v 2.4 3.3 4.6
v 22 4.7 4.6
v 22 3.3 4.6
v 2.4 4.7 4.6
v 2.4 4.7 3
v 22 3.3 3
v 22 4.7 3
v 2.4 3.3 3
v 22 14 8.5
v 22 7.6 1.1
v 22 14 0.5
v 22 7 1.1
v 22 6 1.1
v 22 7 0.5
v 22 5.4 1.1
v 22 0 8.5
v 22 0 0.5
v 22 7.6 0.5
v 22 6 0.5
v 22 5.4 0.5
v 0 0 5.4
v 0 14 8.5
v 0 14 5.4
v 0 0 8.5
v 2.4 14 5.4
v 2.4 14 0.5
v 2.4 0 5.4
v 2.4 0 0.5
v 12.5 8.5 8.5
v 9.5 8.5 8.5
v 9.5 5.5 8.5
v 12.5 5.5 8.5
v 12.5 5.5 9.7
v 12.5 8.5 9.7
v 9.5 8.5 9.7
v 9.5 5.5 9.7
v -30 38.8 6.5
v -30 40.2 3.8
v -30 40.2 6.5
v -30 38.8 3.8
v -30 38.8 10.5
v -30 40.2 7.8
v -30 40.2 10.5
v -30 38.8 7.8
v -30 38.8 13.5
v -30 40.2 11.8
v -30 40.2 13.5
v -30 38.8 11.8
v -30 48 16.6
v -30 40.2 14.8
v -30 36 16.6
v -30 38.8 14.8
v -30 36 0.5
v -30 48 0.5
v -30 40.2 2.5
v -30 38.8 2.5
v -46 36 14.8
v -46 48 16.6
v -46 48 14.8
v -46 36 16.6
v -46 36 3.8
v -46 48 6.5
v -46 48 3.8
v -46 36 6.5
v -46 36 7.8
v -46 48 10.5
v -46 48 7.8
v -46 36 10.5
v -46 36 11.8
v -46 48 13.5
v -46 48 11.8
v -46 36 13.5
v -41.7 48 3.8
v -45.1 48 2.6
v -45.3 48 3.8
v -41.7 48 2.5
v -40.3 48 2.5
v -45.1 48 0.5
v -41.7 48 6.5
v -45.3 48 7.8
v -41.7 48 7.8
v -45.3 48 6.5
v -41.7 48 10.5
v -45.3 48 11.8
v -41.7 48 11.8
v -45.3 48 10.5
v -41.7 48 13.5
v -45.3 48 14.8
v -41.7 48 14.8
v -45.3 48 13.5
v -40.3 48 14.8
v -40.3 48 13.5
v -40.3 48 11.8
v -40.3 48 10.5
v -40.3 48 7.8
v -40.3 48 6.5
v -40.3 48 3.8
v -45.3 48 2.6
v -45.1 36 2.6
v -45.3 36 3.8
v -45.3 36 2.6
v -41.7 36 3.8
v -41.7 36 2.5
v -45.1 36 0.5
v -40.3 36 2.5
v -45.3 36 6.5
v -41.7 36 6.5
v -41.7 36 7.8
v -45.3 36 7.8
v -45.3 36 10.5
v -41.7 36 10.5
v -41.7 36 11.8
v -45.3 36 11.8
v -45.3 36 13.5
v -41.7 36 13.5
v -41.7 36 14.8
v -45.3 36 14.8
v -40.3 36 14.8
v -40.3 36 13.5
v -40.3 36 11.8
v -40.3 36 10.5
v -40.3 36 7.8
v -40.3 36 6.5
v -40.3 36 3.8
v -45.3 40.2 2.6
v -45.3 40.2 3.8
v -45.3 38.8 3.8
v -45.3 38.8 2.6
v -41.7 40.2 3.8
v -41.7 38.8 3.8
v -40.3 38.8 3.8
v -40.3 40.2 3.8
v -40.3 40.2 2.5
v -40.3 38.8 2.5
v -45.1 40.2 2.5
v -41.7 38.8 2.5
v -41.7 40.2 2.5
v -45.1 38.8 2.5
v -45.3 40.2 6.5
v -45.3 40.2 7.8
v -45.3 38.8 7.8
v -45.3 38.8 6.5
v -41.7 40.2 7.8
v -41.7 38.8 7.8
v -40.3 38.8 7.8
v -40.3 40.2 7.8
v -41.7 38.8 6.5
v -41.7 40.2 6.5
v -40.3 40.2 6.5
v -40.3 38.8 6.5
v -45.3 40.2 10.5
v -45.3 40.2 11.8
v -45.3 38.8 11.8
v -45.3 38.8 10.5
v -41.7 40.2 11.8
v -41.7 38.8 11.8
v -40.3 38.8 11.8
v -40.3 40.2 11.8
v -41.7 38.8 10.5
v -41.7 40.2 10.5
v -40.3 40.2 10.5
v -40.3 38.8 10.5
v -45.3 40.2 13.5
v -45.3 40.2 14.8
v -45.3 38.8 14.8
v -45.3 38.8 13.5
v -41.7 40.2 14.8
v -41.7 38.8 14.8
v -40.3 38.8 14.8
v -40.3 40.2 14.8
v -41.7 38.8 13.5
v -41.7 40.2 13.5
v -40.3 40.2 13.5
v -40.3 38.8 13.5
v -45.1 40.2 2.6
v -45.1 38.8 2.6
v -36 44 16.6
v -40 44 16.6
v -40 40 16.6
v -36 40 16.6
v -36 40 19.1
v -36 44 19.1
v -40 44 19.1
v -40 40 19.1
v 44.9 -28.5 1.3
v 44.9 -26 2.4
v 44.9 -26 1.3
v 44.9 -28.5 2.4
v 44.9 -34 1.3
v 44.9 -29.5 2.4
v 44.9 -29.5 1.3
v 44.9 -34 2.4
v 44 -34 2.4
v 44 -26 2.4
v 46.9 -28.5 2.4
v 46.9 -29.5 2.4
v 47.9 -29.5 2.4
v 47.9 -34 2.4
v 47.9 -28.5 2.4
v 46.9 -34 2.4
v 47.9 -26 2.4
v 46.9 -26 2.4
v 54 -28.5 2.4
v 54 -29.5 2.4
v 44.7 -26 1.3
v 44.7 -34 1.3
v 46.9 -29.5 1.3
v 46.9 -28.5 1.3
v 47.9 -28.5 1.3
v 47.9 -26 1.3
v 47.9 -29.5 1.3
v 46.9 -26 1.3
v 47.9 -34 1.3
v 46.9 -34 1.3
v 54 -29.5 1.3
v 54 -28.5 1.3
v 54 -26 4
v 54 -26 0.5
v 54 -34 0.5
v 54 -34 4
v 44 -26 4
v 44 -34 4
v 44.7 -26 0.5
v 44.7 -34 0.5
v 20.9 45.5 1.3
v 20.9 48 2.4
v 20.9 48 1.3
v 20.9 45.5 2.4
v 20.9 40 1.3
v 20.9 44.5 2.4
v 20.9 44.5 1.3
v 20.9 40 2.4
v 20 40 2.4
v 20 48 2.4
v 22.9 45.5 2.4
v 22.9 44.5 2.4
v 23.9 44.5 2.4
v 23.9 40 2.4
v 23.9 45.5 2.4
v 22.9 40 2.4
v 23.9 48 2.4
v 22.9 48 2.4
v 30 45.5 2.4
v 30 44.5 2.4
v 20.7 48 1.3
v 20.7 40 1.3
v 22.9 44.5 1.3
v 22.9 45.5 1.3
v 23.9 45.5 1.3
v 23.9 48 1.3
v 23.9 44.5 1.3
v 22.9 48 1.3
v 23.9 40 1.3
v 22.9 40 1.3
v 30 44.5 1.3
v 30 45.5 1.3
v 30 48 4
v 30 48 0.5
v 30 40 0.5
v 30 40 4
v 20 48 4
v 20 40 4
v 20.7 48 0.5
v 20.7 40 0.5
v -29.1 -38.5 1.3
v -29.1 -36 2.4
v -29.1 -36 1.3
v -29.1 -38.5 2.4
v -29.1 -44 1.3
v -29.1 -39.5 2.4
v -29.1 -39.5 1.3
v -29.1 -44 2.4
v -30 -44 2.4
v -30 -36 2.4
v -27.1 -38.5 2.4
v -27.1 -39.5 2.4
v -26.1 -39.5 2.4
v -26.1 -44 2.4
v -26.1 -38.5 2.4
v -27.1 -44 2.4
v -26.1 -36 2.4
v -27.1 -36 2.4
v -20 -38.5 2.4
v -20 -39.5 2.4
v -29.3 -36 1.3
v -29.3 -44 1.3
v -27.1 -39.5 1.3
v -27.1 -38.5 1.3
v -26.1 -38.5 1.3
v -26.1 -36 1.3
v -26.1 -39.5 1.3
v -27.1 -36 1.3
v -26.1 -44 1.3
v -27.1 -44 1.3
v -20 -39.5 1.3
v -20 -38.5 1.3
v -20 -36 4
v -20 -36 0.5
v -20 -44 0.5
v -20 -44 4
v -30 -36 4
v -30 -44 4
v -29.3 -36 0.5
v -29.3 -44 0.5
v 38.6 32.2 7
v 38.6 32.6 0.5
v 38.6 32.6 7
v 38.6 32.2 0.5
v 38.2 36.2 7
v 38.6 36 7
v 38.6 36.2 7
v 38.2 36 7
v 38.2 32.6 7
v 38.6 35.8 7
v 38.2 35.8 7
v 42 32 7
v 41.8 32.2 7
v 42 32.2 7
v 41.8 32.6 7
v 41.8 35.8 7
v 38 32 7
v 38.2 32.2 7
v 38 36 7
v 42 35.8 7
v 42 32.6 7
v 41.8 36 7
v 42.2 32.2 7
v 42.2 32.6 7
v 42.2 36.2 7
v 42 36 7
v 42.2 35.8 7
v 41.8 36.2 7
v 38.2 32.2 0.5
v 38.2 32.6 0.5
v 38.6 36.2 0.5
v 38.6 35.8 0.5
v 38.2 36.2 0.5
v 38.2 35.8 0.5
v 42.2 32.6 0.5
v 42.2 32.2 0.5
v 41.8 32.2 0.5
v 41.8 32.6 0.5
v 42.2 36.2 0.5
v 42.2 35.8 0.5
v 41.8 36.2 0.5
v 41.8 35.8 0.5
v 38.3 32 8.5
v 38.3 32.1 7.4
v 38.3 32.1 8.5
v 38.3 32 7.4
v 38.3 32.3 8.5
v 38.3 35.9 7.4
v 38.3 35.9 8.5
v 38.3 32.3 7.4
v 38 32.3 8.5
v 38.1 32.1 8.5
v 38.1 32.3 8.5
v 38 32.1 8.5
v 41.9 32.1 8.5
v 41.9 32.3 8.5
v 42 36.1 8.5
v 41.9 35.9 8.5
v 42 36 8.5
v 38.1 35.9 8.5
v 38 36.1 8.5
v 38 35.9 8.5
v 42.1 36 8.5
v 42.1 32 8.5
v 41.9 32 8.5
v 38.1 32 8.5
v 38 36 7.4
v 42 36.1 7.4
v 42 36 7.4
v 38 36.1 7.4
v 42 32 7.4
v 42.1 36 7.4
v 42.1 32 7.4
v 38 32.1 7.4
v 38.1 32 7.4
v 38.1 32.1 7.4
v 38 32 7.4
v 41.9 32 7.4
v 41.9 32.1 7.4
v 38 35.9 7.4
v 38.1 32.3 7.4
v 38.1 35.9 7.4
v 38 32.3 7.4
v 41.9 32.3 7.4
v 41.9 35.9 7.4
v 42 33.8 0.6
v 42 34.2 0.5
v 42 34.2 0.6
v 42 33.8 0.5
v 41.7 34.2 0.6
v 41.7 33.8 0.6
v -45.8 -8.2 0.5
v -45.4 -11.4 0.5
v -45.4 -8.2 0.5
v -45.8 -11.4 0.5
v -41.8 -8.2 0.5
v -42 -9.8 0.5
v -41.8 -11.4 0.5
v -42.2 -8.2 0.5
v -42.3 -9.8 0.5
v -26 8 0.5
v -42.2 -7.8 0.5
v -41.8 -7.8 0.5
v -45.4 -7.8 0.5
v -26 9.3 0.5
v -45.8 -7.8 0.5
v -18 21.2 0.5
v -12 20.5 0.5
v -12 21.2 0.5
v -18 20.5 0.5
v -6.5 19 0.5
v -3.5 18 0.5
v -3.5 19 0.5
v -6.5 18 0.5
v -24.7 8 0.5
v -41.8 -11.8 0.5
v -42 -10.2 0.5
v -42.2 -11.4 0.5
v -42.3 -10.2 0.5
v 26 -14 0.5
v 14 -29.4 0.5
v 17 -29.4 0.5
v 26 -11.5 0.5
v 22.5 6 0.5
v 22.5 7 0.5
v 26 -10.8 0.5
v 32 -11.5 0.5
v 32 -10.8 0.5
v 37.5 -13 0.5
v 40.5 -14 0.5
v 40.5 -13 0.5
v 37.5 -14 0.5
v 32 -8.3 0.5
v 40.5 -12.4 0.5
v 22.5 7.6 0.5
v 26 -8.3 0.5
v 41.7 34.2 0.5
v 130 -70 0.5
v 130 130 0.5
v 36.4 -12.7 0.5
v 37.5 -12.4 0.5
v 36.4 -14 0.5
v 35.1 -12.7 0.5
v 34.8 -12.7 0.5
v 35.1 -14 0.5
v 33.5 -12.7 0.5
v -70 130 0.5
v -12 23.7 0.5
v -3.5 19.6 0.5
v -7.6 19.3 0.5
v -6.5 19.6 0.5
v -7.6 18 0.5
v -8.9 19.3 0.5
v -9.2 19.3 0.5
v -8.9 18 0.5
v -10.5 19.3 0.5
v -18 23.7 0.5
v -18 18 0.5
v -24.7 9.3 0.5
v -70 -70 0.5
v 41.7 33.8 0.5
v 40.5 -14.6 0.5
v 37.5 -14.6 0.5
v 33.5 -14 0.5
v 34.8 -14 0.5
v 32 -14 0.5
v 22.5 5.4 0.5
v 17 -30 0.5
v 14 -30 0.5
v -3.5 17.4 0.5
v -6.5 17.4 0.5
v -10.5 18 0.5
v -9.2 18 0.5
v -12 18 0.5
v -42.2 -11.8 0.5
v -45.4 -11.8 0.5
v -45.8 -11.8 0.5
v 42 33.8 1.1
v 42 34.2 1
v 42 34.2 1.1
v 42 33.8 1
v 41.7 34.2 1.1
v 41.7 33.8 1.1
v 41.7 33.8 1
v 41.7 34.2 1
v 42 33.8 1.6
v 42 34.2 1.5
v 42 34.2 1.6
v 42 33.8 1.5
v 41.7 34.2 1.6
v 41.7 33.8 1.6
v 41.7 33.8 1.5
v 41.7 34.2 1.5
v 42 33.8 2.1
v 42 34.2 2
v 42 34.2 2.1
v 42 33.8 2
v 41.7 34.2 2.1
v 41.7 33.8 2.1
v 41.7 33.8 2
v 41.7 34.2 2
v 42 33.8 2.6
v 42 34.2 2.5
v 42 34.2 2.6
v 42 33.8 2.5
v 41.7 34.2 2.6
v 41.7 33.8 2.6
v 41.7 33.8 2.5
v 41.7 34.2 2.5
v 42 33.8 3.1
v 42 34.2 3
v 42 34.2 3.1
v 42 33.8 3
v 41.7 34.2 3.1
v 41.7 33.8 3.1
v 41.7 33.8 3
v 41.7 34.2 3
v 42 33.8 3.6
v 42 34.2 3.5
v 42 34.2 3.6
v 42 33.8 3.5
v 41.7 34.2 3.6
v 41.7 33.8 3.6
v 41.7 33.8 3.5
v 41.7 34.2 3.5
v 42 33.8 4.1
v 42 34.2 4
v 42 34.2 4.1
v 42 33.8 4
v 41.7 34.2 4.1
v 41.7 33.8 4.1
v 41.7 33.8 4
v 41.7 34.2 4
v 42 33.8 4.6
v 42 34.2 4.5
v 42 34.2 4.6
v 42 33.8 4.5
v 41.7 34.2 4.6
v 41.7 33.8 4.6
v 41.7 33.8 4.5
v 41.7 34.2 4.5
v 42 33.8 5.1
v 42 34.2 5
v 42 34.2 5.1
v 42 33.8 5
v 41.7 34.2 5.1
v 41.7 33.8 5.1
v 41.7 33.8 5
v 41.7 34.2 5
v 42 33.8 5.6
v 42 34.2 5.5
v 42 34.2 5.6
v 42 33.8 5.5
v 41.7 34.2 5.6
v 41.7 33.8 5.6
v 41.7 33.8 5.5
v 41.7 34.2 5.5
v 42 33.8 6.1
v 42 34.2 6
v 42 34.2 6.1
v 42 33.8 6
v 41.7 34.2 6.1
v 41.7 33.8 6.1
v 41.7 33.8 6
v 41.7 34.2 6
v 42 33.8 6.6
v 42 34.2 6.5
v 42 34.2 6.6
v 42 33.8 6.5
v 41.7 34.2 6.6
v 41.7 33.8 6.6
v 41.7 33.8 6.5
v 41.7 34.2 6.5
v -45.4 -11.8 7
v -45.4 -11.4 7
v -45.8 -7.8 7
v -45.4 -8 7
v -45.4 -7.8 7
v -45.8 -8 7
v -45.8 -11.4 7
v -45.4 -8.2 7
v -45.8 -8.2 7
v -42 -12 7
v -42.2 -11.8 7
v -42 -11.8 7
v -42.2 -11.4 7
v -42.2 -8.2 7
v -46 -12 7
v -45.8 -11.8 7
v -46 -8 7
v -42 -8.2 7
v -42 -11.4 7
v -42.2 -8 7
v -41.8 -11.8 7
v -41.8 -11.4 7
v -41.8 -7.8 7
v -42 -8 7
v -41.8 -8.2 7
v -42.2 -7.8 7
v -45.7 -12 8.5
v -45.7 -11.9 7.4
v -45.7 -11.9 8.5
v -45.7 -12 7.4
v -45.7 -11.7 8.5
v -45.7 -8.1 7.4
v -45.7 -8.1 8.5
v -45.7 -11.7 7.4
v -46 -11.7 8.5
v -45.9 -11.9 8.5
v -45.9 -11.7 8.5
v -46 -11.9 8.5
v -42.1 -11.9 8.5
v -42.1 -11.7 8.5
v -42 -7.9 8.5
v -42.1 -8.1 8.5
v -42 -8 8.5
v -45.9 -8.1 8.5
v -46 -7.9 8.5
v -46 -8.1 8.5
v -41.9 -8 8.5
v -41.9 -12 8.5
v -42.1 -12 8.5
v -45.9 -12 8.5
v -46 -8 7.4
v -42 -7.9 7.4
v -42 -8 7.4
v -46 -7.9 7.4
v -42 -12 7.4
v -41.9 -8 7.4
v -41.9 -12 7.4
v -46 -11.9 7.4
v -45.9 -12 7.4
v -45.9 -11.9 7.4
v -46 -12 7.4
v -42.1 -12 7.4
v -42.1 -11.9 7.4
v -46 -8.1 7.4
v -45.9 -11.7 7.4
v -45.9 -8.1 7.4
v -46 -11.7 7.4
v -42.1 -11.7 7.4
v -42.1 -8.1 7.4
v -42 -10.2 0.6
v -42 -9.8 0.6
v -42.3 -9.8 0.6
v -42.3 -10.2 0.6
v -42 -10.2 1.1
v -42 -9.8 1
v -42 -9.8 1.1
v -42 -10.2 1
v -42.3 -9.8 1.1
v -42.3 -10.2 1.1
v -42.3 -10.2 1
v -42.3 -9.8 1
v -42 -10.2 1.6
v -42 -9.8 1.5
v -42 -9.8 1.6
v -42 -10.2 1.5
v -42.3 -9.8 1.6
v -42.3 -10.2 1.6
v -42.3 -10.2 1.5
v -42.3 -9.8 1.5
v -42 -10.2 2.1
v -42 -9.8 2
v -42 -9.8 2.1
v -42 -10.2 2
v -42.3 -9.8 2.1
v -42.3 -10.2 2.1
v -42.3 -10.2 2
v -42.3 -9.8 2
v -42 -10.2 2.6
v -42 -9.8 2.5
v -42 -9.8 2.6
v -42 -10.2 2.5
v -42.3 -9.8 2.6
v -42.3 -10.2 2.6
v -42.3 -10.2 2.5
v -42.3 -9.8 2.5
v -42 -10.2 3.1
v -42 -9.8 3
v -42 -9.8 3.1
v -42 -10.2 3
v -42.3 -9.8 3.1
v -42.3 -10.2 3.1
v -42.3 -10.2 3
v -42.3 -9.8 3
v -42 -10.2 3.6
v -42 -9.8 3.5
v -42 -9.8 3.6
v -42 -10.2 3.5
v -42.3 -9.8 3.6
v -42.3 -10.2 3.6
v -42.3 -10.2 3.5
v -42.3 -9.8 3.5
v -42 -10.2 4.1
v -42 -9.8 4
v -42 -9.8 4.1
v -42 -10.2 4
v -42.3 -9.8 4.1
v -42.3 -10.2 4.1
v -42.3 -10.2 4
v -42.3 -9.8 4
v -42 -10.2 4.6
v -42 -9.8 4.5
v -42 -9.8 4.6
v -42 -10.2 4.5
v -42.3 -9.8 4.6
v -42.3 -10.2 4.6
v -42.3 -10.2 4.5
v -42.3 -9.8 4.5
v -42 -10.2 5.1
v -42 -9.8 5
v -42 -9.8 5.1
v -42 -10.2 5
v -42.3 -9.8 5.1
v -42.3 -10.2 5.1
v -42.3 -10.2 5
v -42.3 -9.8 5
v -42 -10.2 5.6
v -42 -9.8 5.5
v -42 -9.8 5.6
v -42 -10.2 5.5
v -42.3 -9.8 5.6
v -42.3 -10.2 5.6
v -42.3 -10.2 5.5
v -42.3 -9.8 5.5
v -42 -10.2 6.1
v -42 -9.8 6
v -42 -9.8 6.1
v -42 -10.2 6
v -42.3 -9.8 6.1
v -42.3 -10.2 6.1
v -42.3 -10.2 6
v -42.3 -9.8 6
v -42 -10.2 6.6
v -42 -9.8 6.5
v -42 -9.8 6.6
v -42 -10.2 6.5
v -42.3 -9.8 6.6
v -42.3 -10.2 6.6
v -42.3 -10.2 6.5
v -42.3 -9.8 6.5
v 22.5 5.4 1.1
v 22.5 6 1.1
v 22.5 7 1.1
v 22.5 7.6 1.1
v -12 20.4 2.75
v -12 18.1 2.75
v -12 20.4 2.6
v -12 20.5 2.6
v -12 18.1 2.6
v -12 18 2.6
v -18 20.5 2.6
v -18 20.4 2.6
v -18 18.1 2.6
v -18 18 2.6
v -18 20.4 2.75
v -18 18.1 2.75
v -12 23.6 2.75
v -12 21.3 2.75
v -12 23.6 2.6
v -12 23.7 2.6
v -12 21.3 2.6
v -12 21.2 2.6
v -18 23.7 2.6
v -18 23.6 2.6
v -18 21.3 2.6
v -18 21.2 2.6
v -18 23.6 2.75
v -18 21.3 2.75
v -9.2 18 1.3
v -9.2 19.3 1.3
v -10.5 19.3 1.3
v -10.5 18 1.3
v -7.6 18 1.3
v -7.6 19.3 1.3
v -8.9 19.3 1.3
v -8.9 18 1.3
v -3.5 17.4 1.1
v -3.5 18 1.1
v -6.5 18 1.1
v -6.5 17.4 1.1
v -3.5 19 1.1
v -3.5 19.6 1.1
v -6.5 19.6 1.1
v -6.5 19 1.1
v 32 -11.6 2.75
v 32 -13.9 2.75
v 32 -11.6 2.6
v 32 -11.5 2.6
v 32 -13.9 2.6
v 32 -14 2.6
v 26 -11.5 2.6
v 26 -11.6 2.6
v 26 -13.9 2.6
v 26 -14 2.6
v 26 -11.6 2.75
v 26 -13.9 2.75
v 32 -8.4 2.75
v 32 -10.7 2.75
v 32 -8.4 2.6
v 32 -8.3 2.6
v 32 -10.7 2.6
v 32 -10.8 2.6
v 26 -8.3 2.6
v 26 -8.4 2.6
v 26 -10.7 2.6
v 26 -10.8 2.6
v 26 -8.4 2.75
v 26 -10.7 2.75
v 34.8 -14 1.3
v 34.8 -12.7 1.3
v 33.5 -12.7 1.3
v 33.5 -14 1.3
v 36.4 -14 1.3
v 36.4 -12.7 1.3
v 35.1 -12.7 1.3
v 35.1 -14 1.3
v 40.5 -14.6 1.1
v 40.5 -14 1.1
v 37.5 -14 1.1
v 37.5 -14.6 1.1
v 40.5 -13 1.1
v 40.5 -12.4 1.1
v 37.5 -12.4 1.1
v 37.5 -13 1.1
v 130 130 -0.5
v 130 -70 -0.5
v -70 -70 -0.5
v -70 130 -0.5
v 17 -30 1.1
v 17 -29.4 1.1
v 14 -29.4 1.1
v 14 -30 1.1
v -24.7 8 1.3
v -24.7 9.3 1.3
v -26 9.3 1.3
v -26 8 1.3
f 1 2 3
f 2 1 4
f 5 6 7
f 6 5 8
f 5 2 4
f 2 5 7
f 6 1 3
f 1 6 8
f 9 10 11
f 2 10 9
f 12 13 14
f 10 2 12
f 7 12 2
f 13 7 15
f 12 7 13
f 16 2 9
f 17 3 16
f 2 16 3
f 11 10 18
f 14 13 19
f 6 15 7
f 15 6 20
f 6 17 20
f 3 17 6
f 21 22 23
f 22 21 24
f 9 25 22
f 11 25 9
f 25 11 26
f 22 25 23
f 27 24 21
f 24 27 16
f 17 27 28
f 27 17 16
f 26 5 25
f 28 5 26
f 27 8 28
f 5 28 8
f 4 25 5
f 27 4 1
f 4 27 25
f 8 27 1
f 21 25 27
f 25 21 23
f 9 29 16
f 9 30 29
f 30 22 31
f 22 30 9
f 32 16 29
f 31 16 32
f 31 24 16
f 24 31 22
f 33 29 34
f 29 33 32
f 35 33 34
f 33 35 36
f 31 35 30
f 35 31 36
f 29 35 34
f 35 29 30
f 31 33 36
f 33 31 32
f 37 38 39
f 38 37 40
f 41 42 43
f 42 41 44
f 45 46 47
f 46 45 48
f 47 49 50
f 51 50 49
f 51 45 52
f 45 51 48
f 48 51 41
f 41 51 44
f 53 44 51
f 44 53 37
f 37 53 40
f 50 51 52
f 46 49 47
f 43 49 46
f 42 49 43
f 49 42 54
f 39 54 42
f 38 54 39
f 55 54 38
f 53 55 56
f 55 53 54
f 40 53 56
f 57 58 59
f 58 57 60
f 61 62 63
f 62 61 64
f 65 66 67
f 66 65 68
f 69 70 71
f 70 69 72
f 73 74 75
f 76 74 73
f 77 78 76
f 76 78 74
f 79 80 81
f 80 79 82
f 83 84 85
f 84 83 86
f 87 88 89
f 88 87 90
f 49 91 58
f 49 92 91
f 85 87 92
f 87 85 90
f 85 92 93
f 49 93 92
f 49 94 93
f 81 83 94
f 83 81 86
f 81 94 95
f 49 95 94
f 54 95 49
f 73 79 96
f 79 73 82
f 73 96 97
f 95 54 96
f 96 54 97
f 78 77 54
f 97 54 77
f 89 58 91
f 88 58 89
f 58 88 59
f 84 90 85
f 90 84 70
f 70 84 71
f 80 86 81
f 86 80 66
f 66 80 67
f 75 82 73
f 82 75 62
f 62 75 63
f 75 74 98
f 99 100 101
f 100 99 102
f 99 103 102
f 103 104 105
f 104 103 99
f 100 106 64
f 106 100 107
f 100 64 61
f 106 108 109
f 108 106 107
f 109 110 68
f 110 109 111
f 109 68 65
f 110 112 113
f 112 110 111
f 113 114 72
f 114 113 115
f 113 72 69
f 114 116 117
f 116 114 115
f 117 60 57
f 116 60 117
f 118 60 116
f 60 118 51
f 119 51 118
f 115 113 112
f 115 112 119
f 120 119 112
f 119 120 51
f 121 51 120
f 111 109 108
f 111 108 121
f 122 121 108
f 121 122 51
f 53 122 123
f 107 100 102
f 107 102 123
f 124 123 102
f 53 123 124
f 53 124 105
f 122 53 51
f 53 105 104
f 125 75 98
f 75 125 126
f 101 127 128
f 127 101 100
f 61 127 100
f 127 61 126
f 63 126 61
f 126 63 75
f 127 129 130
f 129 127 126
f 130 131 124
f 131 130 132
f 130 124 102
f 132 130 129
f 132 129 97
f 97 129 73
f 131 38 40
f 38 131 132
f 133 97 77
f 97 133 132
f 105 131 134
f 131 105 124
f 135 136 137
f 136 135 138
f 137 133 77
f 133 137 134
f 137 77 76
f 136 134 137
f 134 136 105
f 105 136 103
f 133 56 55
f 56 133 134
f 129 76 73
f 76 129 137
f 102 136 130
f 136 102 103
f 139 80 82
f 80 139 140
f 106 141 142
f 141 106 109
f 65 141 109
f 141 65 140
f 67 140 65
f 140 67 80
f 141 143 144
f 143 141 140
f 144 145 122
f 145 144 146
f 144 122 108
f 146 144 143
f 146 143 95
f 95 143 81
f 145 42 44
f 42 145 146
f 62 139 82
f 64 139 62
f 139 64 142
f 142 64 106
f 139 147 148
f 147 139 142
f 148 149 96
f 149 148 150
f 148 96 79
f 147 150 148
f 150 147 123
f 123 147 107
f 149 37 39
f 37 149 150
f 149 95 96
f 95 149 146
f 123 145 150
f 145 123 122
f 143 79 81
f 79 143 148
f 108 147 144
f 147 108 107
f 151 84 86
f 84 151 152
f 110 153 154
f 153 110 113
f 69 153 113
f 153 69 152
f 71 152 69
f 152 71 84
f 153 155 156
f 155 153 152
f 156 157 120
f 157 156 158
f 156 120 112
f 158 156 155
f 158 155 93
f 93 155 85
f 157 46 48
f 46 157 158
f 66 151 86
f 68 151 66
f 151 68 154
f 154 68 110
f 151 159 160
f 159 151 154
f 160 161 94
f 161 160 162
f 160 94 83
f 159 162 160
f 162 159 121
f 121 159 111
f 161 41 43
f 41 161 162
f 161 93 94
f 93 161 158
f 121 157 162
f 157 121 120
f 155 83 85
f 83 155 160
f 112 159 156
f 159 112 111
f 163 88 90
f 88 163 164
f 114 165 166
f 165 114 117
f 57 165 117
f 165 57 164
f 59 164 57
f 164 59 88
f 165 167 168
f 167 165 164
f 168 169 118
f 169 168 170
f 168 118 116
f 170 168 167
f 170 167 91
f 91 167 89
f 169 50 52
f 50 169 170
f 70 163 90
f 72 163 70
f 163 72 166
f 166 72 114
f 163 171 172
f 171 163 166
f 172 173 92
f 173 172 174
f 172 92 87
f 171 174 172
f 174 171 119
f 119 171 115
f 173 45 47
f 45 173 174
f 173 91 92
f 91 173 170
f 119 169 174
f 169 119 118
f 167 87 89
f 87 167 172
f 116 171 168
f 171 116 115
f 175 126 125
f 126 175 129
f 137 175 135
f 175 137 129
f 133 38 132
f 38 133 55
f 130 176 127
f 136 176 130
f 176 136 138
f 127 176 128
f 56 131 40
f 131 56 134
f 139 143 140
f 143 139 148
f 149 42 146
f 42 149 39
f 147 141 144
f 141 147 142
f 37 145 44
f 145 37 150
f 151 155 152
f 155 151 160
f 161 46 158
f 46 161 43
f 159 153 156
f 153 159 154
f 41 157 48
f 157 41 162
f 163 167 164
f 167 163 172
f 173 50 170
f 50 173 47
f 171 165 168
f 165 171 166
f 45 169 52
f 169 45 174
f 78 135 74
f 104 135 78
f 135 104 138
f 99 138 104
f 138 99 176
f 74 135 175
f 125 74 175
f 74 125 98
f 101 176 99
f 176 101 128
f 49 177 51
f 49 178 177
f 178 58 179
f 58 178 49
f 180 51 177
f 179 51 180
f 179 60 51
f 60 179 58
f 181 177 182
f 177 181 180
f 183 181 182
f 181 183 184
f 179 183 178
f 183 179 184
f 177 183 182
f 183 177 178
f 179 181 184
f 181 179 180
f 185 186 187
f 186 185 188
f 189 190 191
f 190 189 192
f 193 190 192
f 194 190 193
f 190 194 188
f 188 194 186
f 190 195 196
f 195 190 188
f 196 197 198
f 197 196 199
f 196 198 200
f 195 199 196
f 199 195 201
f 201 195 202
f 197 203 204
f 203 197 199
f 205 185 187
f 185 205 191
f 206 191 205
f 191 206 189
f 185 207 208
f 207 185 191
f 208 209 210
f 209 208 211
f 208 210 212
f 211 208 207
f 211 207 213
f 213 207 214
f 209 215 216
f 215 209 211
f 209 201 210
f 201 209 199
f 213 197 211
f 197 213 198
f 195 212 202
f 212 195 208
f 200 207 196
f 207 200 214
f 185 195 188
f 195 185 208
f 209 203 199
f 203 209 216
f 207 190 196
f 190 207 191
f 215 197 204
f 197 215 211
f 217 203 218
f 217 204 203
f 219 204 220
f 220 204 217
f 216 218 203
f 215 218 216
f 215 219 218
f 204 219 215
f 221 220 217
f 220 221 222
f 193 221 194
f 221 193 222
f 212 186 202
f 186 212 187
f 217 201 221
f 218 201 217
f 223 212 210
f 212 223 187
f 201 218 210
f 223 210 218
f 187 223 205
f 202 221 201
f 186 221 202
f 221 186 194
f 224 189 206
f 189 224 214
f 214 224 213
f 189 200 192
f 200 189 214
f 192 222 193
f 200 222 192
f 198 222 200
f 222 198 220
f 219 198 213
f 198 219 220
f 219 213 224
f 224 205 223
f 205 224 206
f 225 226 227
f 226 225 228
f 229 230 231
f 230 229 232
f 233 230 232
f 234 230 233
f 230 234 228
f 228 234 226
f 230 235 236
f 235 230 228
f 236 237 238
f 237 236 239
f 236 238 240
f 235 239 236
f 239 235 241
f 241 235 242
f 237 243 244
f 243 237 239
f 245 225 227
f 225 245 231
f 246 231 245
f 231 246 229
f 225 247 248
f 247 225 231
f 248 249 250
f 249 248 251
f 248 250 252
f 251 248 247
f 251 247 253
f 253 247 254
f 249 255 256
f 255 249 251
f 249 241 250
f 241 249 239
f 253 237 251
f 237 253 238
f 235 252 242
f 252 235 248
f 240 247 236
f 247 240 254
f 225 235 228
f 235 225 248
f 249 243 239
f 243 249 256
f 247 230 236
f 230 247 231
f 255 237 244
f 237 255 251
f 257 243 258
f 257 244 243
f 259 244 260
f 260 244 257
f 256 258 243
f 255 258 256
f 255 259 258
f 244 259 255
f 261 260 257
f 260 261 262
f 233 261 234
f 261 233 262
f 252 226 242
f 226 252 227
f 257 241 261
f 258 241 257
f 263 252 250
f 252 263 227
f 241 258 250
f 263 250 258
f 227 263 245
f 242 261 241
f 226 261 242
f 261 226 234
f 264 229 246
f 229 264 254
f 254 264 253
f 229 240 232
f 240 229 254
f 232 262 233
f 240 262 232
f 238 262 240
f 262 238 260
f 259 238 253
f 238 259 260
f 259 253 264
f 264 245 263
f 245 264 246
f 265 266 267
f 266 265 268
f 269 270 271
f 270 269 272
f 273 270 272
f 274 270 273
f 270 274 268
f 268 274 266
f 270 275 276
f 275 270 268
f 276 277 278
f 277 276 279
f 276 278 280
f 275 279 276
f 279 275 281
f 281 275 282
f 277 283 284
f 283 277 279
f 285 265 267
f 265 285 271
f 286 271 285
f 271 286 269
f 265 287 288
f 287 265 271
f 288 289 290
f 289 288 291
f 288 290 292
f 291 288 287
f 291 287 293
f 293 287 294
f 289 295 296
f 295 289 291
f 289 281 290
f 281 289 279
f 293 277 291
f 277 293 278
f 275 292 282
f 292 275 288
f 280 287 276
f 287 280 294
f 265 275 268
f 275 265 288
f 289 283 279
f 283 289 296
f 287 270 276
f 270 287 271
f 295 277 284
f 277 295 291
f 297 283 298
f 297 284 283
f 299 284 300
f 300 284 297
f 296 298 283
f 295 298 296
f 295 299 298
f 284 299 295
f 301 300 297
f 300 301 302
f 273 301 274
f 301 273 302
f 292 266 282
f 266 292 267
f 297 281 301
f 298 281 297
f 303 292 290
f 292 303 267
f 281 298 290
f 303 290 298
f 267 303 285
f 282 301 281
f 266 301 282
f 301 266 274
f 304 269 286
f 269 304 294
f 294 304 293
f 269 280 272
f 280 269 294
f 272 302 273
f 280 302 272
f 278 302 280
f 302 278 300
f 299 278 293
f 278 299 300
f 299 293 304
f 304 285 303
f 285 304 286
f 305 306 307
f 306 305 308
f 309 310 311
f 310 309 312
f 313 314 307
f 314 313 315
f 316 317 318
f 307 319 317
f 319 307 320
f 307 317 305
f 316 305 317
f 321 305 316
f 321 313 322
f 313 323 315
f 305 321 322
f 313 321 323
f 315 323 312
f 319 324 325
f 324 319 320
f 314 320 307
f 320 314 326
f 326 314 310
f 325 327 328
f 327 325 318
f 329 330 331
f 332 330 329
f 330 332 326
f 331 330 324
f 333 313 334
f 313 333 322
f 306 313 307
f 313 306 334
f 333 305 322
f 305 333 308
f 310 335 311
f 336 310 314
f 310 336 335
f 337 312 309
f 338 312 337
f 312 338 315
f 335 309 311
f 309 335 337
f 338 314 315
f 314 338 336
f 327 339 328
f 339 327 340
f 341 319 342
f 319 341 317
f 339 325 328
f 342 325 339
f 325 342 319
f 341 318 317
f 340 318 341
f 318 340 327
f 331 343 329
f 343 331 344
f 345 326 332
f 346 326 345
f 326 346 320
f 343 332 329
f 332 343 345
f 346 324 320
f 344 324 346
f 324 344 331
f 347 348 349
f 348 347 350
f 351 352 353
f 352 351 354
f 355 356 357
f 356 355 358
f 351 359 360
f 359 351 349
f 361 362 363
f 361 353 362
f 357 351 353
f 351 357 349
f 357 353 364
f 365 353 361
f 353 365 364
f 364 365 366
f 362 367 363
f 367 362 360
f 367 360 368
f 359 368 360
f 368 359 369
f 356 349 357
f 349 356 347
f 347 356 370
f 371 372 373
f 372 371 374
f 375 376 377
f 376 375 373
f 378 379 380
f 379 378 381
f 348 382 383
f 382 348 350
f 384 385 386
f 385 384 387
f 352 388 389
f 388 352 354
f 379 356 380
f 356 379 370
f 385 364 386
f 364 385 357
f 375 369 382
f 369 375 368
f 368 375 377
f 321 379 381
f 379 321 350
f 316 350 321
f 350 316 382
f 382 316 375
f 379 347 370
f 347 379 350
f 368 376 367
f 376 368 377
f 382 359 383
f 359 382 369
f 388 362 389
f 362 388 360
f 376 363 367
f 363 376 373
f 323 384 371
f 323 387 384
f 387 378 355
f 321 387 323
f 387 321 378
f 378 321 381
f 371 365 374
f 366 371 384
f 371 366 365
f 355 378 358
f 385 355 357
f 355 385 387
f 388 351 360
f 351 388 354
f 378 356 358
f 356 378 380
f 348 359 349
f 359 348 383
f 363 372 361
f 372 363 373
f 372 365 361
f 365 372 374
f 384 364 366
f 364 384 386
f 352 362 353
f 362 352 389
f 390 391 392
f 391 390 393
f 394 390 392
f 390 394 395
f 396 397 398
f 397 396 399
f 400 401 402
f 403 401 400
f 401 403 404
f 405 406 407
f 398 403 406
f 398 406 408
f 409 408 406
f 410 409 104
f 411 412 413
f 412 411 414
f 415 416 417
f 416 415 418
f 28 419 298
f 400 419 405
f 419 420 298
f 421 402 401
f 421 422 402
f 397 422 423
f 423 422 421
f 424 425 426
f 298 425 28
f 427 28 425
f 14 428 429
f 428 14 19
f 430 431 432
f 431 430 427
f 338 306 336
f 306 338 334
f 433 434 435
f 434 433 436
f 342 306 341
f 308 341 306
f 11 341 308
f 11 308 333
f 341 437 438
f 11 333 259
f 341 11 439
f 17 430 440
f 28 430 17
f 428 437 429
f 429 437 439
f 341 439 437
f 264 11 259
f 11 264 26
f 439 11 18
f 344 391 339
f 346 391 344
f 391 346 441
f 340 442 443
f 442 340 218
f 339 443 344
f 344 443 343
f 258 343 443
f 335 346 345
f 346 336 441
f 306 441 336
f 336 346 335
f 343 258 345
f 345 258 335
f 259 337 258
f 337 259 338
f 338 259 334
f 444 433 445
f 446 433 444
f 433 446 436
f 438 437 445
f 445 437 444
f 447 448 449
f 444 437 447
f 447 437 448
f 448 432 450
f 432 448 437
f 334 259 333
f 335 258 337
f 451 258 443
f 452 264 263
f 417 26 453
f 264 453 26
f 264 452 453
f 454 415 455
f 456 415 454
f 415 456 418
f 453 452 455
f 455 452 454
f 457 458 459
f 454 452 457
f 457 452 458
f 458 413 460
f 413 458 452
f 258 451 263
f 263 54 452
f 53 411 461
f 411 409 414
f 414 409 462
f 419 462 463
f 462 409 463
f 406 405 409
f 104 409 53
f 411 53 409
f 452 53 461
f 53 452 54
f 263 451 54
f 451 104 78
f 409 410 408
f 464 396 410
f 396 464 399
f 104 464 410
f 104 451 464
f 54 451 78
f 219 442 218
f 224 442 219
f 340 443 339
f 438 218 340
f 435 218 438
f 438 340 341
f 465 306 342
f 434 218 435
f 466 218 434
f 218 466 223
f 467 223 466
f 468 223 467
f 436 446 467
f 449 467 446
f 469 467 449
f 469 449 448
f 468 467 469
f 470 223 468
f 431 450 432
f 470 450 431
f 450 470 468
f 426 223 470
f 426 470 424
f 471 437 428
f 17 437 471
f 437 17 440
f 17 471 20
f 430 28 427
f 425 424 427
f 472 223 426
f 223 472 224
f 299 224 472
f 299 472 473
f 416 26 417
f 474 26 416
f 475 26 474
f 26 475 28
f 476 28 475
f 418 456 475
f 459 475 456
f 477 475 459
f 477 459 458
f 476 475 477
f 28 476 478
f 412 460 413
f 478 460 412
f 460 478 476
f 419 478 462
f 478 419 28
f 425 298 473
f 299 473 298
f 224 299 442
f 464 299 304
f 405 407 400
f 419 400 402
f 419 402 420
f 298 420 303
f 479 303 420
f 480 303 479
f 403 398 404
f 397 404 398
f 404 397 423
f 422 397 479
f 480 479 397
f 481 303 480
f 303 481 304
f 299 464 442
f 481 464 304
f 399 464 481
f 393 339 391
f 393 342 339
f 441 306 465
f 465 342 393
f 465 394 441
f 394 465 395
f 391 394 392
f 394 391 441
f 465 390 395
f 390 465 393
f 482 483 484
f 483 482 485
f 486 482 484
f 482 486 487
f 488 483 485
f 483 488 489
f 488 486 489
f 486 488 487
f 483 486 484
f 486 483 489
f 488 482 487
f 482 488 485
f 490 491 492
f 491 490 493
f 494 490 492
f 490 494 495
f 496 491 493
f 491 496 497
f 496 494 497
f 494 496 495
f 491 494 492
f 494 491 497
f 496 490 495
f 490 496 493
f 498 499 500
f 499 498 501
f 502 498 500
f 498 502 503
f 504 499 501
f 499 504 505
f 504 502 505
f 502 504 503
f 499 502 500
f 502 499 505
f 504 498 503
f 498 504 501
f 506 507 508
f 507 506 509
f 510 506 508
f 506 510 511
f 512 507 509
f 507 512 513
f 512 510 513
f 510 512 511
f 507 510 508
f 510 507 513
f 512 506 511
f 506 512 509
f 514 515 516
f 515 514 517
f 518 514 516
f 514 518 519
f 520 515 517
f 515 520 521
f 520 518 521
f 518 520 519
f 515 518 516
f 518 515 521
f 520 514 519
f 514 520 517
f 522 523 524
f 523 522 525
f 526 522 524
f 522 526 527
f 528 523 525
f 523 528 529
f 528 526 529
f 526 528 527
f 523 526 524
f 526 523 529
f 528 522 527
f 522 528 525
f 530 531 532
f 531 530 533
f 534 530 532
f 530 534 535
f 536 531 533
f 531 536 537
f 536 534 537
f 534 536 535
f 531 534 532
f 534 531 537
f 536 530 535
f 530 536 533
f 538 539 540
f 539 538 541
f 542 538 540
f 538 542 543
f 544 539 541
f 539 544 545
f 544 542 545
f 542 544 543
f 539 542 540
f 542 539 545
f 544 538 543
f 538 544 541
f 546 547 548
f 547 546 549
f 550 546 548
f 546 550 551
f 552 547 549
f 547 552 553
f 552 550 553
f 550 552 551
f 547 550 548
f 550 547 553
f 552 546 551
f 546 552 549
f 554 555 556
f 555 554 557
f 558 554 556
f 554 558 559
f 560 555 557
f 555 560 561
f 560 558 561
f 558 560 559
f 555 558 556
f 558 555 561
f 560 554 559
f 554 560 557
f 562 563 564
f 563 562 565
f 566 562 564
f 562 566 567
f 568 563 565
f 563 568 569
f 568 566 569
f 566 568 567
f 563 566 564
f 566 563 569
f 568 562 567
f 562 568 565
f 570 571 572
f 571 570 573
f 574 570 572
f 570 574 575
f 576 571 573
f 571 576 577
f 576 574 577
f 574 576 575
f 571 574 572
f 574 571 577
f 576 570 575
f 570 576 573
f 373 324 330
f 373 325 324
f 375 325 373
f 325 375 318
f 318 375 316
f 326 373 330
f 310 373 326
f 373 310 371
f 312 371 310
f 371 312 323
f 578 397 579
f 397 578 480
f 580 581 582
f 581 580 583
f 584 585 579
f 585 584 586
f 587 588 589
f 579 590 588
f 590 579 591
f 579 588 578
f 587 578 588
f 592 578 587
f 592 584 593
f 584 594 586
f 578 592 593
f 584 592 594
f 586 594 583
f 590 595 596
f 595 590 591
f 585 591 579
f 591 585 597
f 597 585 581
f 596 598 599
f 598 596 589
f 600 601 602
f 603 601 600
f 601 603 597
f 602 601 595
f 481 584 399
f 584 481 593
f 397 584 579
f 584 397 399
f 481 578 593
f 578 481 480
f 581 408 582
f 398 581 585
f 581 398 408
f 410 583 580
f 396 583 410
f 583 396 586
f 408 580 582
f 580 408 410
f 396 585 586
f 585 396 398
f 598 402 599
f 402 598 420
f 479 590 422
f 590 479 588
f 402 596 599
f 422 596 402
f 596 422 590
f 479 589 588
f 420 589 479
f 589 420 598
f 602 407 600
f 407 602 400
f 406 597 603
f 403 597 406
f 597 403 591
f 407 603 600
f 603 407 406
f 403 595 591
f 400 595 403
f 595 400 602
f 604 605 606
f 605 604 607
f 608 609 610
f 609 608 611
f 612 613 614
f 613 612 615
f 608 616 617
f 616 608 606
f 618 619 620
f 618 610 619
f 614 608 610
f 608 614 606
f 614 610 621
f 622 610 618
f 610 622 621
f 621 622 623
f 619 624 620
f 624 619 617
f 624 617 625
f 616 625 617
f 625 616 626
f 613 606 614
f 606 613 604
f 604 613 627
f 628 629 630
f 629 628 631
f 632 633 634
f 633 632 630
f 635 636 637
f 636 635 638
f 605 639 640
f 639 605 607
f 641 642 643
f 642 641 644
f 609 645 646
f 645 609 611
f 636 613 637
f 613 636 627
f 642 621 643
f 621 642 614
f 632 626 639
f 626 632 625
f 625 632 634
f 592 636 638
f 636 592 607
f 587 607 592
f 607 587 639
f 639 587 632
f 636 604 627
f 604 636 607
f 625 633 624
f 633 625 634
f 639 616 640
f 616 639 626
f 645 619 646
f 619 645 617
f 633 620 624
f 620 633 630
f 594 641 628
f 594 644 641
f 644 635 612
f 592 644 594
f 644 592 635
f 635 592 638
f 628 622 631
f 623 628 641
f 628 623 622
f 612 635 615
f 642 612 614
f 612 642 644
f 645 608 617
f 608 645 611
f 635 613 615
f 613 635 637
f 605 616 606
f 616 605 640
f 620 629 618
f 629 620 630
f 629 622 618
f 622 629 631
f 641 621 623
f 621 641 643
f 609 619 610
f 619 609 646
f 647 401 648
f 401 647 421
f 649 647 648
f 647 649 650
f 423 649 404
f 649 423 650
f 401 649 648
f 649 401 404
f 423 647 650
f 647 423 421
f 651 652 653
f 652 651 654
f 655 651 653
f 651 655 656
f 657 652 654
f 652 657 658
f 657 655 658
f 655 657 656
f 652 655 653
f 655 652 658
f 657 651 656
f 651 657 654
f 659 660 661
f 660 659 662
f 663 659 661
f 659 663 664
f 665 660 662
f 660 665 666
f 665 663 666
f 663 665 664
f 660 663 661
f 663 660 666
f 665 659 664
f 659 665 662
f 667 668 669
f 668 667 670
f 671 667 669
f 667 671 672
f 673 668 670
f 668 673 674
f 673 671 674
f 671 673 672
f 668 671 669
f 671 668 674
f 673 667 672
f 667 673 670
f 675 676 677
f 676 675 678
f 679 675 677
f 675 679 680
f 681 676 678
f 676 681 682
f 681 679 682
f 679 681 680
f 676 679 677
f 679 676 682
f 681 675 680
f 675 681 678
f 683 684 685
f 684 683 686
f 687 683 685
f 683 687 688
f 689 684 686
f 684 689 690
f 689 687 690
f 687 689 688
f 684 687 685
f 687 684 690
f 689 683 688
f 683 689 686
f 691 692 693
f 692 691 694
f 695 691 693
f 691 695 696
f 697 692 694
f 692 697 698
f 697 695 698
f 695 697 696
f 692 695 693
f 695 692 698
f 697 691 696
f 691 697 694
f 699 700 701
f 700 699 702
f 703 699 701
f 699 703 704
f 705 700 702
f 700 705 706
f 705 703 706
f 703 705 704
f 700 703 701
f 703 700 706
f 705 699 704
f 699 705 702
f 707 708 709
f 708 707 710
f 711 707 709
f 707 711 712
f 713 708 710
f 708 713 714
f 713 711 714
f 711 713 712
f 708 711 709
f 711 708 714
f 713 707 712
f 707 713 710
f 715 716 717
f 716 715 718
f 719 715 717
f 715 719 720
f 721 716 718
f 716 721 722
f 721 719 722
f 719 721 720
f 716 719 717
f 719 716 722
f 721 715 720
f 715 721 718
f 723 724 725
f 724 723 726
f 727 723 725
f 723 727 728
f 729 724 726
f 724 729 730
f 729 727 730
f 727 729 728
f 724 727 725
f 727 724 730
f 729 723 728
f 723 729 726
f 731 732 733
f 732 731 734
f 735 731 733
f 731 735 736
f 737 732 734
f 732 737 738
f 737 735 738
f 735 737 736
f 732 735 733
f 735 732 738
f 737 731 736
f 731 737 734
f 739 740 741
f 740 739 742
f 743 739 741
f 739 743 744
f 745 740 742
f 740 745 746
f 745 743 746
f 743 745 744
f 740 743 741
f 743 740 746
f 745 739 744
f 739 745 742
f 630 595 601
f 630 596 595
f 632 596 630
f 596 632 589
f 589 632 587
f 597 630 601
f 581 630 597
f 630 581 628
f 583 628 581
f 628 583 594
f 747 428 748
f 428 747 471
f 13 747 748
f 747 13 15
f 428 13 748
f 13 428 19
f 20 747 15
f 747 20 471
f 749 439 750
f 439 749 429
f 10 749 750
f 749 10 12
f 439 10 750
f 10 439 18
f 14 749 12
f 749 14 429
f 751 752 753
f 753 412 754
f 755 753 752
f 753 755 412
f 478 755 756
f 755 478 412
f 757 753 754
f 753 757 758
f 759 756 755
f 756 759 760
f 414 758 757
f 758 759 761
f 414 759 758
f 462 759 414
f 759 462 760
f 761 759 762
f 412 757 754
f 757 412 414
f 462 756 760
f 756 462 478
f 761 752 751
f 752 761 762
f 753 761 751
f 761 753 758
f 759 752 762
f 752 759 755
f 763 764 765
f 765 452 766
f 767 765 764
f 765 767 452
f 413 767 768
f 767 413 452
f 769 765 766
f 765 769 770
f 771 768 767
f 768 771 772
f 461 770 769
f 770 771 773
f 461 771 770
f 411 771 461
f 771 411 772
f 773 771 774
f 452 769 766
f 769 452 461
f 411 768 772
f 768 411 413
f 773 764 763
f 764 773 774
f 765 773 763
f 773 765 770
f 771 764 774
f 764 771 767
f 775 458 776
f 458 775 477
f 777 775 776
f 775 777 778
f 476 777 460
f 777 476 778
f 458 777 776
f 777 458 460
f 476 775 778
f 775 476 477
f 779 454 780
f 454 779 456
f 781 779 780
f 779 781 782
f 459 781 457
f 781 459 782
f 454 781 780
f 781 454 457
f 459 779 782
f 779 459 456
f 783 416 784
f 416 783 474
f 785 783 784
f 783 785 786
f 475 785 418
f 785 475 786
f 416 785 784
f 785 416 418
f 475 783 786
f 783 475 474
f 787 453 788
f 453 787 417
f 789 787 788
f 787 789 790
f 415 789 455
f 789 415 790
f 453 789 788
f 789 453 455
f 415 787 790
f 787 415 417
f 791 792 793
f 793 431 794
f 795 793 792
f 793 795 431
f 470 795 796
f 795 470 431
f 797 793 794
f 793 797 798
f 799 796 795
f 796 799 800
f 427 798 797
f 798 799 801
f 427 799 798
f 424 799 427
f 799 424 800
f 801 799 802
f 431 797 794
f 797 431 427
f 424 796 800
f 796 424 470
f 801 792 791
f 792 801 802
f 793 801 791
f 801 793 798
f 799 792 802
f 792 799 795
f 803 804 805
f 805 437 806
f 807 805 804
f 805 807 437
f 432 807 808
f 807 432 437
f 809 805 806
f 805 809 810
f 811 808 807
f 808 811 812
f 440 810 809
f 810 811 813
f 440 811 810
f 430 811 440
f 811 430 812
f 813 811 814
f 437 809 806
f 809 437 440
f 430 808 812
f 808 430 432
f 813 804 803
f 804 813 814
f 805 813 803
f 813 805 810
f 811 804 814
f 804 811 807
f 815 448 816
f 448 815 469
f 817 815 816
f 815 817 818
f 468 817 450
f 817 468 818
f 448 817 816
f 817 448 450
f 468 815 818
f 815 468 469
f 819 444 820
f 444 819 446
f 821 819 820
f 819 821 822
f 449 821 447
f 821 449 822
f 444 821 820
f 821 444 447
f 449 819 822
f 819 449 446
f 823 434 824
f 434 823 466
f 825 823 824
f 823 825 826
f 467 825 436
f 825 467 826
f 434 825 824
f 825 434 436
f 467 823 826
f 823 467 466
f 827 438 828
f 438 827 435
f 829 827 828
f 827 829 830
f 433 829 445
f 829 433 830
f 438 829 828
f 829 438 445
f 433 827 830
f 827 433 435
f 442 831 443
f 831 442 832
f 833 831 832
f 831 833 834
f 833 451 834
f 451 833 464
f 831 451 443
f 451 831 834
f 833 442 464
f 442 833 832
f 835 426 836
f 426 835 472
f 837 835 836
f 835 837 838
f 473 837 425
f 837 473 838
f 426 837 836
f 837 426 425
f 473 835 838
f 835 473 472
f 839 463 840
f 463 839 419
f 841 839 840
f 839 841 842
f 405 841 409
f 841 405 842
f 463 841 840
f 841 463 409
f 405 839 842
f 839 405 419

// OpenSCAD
// 枪战据点 (battle_map) — 和平精英/三角洲风格 营地布局
// 建筑之间留出交火线，掩体散布成安全角；不是密实街区，而是"据点"
$fn = 4;

module house() {
  w = 10; d = 8; h = 4;
  color([0.82, 0.78, 0.70])
    difference() {
      cube([w, d, h]);
      translate([-0.7, -0.3, 0]) cube([1.4, d + 0.6, 2.2]);
      for (x = [-3.0, 0.4, 3.4])
        translate([x - 0.5, -0.3, 1.3]) cube([1.0, d + 0.6, 1.1]);
      for (y = [-1.0, 5.0])
        translate([-0.3, y - 0.5, 1.3]) cube([w + 0.6, 1.0, 1.1]);
    }
  color([0.62, 0.60, 0.56]) translate([-0.3, -0.3, -0.3]) cube([w + 0.6, d + 0.6, 0.3]);
  color([0.55, 0.32, 0.28])
    polyhedron(
      points = [
        [-w/2 - 0.4, -d/2 - 0.4, h], [w/2 + 0.4, -d/2 - 0.4, h],
        [w/2 + 0.4, d/2 + 0.4, h], [-w/2 - 0.4, d/2 + 0.4, h],
        [-w/2 - 0.4, 0, h + 2.2], [w/2 + 0.4, 0, h + 2.2]
      ],
      faces = [[0,1,5,4],[3,2,5,4],[0,3,4],[1,2,5],[0,1,2,3]]
    );
}

module apartment() {
  w = 16; d = 12; h = 16;
  for (fz = [4, 8, 12])
    color([0.70, 0.70, 0.68]) translate([0, 0, fz]) cube([w, d, 0.3]);
  color([0.80, 0.79, 0.76])
    difference() {
      cube([w, d, h]);
      translate([-0.9, -0.3, 0]) cube([1.8, d + 0.6, 2.6]);
      for (fy = [2.5, 6.5, 10.5, 13.5])
        for (fx = [-5, 0, 5])
          translate([fx - 0.7, -0.3, fy]) cube([1.4, d + 0.6, 1.3]);
      for (fy = [2.5, 6.5, 10.5, 13.5])
        for (fy2 = [-3.5, 3.5])
          translate([-0.3, fy2 - 0.7, fy]) cube([w + 0.6, 1.4, 1.3]);
    }
  color([0.66, 0.66, 0.64]) translate([0, 0, h]) cube([w, d, 0.6]);
  color([0.60, 0.60, 0.58]) translate([w/2 - 2, d/2 - 2, h + 0.6]) cube([4, 4, 2.5]);
}

module warehouse() {
  w = 22; d = 14; h = 8;
  color([0.66, 0.64, 0.60])
    difference() {
      cube([w, d, h]);
      translate([-2.4, -0.3, 0]) cube([4.8, d + 0.6, 5.4]);
      for (yy = [-4.0, 4.0])
        translate([-0.3, yy - 0.7, 3.0]) cube([w + 0.6, 1.4, 1.6]);
    }
  color([0.55, 0.53, 0.50]) translate([0, 0, h]) cube([w, d, 0.5]);
  color([0.50, 0.48, 0.46]) translate([w/2 - 1.5, d/2 - 1.5, h + 0.5]) cube([3, 3, 1.2]);
}

module watchtower() {
  leg_h = 7; leg = 0.4; span = 4;
  for (sx = [-1, 1]) for (sz = [-1, 1])
    color([0.45, 0.35, 0.25])
      translate([sx * (span/2 - leg/2), sz * (span/2 - leg/2), 0]) cube([leg, leg, leg_h]);
  color([0.70, 0.70, 0.68]) translate([-span/2, -span/2, leg_h]) cube([span, span, 0.4]);
  rail_h = 1.1;
  color([0.40, 0.32, 0.24]) {
    for (sx = [-1, 1]) translate([sx * (span/2 - 0.1), -span/2, leg_h + 0.4]) cube([0.2, span, rail_h]);
    for (sz = [-1, 1]) translate([-span/2, sz * (span/2 - 0.1), leg_h + 0.4]) cube([span, 0.2, rail_h]);
  }
  color([0.50, 0.30, 0.26])
    polyhedron(
      points = [
        [-span/2, -span/2, leg_h + 0.4 + rail_h], [span/2, -span/2, leg_h + 0.4 + rail_h],
        [span/2, span/2, leg_h + 0.4 + rail_h], [-span/2, span/2, leg_h + 0.4 + rail_h],
        [0, 0, leg_h + 0.4 + rail_h + 1.6]
      ],
      faces = [[0,1,4],[1,2,4],[2,3,4],[3,0,4],[0,1,2,3]]
    );
  color([0.35, 0.30, 0.22])
    for (i = [0 : 0.5 : leg_h - 0.5])
      translate([span/2 - 0.3, -0.2, i]) cube([0.3, 0.4, 0.1]);
}

module container() {
  color([0.62, 0.30, 0.24]) cube([6, 2.5, 2.6]);
  color([0.30, 0.30, 0.32]) translate([0, 0.1, 2.6]) cube([6, 2.3, 0.15]);
}
module sandbags() {
  color([0.74, 0.68, 0.52])
    for (i = [0 : 1]) for (j = [0 : 2]) translate([j * 1.1, i * 0.6, 0]) cube([1.0, 0.5, 0.5]);
}
module barrier() { color([0.80, 0.80, 0.78]) cube([3, 0.6, 1.1]); }
module crate() { color([0.55, 0.40, 0.26]) cube([1.3, 1.3, 1.3]); }

module cover_cluster() {
  translate([0, 0, 0]) container();
  translate([0, 3.2, 0]) container();
  translate([7.5, 0, 0]) crate();
  translate([9.1, 0, 0]) crate();
  translate([7.5, 1.6, 0]) sandbags();
  translate([11.5, -0.6, 0]) barrier();
  translate([11.5, 1.0, 0]) barrier();
}

// 地面（荒漠/营地色调）
color([0.46, 0.49, 0.43]) translate([-70, -70, -0.5]) cube([200, 200, 1]);

// 据点布局：中央空场 + 四周建筑 + 掩体走廊
translate([0, 0, 0]) warehouse();
translate([-46, 36, 0]) apartment();
translate([44, -34, 0]) house();
translate([20, 40, 0]) house();
translate([-30, -44, 0]) house();
translate([40, 34, 0]) watchtower();
translate([-44, -10, 0]) watchtower();
translate([8, 6, 0]) cover_cluster();
translate([-18, 18, 0]) cover_cluster();
translate([26, -14, 0]) cover_cluster();
translate([-10, -22, 0]) sandbags();
translate([14, -30, 0]) barrier();
translate([-26, 8, 0]) crate();
